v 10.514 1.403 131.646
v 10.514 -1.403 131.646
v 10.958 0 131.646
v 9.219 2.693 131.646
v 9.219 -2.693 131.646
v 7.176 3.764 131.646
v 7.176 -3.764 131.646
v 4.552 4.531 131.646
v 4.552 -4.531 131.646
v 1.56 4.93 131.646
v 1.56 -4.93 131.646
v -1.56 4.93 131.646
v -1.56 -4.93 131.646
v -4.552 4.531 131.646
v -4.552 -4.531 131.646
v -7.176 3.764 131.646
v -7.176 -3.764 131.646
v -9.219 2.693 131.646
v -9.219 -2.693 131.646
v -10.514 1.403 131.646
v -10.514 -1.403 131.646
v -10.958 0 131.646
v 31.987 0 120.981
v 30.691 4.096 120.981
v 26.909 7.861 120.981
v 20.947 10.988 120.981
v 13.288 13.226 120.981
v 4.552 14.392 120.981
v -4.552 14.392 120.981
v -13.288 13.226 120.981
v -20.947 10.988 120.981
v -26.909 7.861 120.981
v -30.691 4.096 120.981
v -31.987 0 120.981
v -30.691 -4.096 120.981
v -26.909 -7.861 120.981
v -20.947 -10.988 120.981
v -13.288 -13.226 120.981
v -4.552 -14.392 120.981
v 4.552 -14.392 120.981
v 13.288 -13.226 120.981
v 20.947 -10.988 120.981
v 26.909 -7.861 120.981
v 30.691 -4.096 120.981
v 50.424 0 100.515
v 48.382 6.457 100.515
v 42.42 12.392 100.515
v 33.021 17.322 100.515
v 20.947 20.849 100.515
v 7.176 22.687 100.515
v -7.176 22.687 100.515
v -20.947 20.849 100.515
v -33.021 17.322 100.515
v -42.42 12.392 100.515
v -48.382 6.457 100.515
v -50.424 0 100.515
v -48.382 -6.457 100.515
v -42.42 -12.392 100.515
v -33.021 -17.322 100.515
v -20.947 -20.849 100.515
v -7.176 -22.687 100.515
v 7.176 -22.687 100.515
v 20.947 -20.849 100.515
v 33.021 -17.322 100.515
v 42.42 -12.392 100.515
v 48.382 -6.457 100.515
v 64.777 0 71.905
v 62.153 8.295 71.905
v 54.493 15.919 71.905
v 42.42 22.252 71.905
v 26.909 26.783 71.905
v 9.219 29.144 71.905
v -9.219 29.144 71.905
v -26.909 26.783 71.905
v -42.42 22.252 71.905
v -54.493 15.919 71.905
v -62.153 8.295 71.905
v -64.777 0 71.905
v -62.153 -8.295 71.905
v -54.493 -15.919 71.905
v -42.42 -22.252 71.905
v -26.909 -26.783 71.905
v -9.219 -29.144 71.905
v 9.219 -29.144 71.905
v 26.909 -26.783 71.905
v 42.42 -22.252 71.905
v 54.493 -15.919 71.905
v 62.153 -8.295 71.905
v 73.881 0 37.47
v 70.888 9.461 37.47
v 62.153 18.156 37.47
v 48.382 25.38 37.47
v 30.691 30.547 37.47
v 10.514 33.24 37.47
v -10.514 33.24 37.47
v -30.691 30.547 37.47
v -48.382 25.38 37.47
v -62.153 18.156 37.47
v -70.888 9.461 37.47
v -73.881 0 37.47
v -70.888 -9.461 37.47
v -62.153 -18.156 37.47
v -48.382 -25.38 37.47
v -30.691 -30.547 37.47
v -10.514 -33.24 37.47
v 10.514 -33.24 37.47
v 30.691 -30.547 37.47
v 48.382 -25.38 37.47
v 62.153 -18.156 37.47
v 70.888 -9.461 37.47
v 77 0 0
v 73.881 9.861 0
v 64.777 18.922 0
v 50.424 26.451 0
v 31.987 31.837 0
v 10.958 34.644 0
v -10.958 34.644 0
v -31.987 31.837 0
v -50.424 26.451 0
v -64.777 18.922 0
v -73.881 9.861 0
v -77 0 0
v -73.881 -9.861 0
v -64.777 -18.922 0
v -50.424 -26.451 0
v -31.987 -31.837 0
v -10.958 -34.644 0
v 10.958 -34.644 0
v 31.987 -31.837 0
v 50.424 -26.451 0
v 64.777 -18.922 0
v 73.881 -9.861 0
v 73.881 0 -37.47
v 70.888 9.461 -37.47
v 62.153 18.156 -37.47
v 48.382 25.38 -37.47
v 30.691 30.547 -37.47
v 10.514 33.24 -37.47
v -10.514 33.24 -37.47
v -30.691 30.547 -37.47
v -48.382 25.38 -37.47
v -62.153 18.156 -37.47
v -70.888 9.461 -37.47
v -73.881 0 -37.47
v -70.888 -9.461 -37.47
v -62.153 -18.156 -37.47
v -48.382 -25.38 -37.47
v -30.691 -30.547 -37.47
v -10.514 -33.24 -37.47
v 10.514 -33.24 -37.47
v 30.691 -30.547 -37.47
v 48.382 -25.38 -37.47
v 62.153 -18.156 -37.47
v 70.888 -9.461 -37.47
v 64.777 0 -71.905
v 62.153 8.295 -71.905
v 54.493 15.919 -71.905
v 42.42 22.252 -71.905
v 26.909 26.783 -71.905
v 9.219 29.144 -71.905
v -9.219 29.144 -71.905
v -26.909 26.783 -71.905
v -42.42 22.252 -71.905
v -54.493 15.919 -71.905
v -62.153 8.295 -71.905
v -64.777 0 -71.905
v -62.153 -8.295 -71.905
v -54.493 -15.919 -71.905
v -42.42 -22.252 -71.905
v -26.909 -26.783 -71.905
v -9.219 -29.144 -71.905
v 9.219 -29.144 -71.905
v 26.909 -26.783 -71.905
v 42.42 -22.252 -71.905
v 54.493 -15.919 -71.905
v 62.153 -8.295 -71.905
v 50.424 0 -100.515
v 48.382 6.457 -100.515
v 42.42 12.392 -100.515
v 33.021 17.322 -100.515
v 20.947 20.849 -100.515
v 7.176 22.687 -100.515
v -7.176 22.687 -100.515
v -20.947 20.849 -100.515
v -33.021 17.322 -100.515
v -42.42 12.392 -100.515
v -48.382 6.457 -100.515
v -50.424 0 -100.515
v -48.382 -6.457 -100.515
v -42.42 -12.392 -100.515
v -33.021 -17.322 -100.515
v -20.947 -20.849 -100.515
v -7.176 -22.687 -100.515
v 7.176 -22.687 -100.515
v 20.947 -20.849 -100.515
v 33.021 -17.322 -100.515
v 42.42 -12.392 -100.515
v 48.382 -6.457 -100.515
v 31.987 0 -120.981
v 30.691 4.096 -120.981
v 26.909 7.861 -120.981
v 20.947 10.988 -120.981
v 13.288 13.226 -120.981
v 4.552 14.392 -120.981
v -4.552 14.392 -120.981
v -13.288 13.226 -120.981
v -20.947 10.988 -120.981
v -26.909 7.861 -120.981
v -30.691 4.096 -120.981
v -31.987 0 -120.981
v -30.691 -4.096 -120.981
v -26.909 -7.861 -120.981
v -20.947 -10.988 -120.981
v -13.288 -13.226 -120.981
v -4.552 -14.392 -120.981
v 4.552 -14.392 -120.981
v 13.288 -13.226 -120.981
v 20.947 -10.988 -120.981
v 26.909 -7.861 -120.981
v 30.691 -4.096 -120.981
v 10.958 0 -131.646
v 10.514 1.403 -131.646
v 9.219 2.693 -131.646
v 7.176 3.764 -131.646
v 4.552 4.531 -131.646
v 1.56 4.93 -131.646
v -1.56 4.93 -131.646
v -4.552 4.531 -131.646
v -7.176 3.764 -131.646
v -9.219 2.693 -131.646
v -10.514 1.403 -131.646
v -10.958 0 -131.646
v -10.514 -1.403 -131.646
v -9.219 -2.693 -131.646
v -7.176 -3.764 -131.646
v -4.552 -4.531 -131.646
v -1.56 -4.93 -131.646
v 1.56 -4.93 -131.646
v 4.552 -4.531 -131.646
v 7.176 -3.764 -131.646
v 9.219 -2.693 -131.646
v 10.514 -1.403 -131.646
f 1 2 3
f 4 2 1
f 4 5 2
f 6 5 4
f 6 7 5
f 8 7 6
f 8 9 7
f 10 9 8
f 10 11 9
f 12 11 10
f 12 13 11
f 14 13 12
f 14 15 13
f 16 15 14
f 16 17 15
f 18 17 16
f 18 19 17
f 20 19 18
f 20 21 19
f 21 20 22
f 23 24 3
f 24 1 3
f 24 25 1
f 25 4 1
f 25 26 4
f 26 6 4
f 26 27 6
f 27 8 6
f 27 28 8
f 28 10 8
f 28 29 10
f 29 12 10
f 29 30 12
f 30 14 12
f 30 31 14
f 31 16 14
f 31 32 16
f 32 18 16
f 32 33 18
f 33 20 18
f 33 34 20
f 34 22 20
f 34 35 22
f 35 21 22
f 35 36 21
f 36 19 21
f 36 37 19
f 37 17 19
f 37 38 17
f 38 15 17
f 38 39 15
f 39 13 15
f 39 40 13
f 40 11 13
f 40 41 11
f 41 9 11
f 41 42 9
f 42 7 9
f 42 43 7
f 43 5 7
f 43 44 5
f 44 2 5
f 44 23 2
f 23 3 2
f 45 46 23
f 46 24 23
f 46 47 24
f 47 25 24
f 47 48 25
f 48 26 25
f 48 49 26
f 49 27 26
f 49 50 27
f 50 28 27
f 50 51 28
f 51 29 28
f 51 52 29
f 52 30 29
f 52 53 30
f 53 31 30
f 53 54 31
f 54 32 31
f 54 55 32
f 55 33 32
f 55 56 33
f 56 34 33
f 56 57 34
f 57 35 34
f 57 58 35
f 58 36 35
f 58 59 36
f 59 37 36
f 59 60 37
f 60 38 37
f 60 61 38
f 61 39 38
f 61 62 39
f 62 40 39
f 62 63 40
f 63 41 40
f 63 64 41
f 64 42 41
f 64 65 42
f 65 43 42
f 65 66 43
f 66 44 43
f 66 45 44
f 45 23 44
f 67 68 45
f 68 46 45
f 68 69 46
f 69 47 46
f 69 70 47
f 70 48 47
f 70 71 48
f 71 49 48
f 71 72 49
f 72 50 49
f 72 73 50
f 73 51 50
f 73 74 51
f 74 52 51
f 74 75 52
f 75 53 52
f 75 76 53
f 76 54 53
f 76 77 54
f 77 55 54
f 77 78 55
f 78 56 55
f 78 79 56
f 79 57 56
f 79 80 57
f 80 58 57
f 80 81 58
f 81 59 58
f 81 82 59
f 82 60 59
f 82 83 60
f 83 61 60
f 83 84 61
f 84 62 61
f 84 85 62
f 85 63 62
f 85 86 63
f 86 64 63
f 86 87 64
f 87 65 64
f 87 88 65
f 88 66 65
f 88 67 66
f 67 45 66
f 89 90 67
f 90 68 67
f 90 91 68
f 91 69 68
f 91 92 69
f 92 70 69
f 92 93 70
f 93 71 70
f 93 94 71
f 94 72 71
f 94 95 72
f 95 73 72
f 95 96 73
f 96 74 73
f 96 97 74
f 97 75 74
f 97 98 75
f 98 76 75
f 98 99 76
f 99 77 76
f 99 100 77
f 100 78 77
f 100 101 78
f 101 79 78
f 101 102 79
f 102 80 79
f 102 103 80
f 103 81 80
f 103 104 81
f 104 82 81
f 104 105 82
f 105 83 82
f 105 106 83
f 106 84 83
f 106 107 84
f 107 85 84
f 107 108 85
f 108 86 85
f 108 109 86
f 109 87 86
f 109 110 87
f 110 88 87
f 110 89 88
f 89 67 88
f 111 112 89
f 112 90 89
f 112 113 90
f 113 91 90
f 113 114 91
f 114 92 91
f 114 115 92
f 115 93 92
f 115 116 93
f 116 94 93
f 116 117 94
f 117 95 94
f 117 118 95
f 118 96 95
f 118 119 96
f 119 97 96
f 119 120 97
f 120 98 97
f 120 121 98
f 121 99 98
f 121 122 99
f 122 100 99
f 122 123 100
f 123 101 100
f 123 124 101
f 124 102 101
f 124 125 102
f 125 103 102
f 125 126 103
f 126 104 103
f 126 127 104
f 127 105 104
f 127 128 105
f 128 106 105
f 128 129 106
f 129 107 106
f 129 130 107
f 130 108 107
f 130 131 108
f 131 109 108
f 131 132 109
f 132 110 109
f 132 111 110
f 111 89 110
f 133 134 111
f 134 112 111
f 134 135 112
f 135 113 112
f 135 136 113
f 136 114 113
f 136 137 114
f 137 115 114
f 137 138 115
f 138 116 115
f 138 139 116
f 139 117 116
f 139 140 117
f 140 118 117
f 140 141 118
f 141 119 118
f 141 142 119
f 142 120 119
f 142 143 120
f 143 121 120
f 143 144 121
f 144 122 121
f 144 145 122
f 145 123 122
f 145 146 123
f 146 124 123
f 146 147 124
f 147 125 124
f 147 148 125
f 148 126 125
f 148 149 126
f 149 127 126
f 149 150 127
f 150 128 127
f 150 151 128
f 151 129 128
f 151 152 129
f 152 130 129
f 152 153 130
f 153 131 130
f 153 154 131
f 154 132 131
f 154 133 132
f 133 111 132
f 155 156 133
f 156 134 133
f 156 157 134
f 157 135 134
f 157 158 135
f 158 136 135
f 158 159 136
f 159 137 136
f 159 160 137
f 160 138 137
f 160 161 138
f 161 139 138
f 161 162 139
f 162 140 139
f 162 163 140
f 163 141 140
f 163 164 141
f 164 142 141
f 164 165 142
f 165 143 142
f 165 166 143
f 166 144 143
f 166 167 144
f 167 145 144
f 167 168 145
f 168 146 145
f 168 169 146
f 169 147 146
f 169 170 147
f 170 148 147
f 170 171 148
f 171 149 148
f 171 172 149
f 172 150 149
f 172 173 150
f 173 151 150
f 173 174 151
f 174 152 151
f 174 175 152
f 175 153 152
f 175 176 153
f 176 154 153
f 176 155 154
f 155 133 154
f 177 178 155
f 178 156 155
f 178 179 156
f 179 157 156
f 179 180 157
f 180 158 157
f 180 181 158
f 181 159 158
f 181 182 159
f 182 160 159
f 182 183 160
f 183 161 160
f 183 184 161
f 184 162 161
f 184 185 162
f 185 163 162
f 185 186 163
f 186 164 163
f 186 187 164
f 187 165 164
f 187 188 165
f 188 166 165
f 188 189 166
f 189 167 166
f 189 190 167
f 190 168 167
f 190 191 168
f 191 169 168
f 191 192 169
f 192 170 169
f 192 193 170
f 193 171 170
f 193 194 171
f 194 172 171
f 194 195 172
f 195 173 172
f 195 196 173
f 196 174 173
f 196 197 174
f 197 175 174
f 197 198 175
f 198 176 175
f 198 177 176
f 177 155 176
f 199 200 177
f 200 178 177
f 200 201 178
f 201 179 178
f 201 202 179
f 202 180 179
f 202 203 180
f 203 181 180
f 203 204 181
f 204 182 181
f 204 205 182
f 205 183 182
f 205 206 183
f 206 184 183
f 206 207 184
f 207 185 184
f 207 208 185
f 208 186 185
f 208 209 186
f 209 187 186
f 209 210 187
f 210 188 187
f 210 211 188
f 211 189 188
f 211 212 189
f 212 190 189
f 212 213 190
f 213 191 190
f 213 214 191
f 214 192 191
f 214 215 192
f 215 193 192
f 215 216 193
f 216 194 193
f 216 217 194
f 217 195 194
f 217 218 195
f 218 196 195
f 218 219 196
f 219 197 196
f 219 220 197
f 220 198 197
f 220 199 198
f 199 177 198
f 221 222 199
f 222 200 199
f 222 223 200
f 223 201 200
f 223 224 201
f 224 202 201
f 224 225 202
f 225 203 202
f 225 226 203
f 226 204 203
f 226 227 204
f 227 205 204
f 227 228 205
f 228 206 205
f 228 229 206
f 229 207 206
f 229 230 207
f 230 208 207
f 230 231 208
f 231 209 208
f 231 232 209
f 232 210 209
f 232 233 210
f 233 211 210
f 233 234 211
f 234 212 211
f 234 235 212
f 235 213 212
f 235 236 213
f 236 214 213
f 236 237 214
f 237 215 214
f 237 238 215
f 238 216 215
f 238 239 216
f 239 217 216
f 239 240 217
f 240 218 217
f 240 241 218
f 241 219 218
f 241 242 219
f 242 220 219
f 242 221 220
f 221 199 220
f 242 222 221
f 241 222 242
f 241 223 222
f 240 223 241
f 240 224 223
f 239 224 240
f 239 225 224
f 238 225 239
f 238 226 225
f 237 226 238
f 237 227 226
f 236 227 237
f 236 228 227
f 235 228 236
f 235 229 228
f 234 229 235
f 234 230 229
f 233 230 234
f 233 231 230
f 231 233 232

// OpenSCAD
// Generated by SolidPython 1.0.1 on 2020-07-29 00:46:49


scale(v = [11, 5, 19]) {
	sphere(r = 7);
}
/***********************************************
*********      SolidPython code:      **********
************************************************
 
# import packages: SolidPython
from solid import *
from solid.utils import *
from itertools import chain, combinations, permutations


class Resize:

    def __init__(self, scad_file):
        self.scad_file = scad_file
        #self.scad_file = import_scad(scad_file)
        # cone/cylinder param:
        self.r1 = 0
        self.r2 = 0
        self.h = 0
        # rectangular prism param:
        self.w = 0
        self.l = 0
        # ellipse param:
        self.r = 0

    # import OpenScad code (file name corresponds to shape)


    # classify shape + parameters
    def assign(self, param1, param2, param3):
        if self.scad_file == 'cone.scad':
            self.r1 = param1
            self.r2 = param2
            self.h = param3
        elif self.scad_file == 'cylinder.scad':
            self.r1 = param1
            self.r2 = param2
            self.h = param3
        elif self.scad_file == 'rectangularPrism.scad':
            self.h = param1
            self.l = param2
            self.w = param3
        else:
            self.r = param1
            self.h = param2

    # resize parameters
    def iterate(self):
        x = range(3, 20, 2)
        i = 1
        if self.scad_file == 'cone.scad':
            tempList = list(permutations(x, 2))
            for temp in tempList:
                param1 = temp[0]
                param2 = temp[1]
                filepath = 'produced_scad_files/' + 'cone' + str(param1) + '_' + str(param2) + '_' + '.scad'
                scad_render_to_file(cylinder(h=param1, r1=param2, r2=0), filepath)

        elif self.scad_file == 'cylinder.scad':
            tempList = list(permutations(x, 3))
            for temp in tempList:
                param1 = temp[0]
                param2 = temp[1]
                filepath = 'produced_scad_files/' + 'cylinder' + str(param1) + '_' + str(param2) + '_' + '.scad'
                scad_render_to_file(cylinder(h=param1, r1=param2, r2=param2), filepath)

        elif self.scad_file == 'rectangularPrism.scad':
            tempList = list(permutations(x, 3))
            for temp in tempList:
                param1 = temp[0]
                param2 = temp[1]
                param3 = temp[2]
                filepath = 'produced_scad_files/' + 'rectangularPrism' + str(param1) + '_' + str(param2) + '_' + str(
                    param3) + '.scad'
                scad_render_to_file(cube(size=(param1, param2, param3)), filepath)

        elif self.scad_file == 'ellipse.scad':
            tempList = list(permutations(x, 4))
            for temp in tempList:
                param1 = temp[0]
                param2 = temp[1]
                param3 = temp[2]
                param4 = temp[3]
                filepath = 'produced_scad_files/' + 'ellipse' + str(param1) + '_' + str(param2) + '_' + str(param3) + '_' + str(param4) + '.scad'
                scad_render_to_file(scale([param1, param2, param3])(sphere(r=param4)), filepath)

    def render_to_scadfile(self):
        scad_render_to_file(scad, 'example.scad') 
 
************************************************/
